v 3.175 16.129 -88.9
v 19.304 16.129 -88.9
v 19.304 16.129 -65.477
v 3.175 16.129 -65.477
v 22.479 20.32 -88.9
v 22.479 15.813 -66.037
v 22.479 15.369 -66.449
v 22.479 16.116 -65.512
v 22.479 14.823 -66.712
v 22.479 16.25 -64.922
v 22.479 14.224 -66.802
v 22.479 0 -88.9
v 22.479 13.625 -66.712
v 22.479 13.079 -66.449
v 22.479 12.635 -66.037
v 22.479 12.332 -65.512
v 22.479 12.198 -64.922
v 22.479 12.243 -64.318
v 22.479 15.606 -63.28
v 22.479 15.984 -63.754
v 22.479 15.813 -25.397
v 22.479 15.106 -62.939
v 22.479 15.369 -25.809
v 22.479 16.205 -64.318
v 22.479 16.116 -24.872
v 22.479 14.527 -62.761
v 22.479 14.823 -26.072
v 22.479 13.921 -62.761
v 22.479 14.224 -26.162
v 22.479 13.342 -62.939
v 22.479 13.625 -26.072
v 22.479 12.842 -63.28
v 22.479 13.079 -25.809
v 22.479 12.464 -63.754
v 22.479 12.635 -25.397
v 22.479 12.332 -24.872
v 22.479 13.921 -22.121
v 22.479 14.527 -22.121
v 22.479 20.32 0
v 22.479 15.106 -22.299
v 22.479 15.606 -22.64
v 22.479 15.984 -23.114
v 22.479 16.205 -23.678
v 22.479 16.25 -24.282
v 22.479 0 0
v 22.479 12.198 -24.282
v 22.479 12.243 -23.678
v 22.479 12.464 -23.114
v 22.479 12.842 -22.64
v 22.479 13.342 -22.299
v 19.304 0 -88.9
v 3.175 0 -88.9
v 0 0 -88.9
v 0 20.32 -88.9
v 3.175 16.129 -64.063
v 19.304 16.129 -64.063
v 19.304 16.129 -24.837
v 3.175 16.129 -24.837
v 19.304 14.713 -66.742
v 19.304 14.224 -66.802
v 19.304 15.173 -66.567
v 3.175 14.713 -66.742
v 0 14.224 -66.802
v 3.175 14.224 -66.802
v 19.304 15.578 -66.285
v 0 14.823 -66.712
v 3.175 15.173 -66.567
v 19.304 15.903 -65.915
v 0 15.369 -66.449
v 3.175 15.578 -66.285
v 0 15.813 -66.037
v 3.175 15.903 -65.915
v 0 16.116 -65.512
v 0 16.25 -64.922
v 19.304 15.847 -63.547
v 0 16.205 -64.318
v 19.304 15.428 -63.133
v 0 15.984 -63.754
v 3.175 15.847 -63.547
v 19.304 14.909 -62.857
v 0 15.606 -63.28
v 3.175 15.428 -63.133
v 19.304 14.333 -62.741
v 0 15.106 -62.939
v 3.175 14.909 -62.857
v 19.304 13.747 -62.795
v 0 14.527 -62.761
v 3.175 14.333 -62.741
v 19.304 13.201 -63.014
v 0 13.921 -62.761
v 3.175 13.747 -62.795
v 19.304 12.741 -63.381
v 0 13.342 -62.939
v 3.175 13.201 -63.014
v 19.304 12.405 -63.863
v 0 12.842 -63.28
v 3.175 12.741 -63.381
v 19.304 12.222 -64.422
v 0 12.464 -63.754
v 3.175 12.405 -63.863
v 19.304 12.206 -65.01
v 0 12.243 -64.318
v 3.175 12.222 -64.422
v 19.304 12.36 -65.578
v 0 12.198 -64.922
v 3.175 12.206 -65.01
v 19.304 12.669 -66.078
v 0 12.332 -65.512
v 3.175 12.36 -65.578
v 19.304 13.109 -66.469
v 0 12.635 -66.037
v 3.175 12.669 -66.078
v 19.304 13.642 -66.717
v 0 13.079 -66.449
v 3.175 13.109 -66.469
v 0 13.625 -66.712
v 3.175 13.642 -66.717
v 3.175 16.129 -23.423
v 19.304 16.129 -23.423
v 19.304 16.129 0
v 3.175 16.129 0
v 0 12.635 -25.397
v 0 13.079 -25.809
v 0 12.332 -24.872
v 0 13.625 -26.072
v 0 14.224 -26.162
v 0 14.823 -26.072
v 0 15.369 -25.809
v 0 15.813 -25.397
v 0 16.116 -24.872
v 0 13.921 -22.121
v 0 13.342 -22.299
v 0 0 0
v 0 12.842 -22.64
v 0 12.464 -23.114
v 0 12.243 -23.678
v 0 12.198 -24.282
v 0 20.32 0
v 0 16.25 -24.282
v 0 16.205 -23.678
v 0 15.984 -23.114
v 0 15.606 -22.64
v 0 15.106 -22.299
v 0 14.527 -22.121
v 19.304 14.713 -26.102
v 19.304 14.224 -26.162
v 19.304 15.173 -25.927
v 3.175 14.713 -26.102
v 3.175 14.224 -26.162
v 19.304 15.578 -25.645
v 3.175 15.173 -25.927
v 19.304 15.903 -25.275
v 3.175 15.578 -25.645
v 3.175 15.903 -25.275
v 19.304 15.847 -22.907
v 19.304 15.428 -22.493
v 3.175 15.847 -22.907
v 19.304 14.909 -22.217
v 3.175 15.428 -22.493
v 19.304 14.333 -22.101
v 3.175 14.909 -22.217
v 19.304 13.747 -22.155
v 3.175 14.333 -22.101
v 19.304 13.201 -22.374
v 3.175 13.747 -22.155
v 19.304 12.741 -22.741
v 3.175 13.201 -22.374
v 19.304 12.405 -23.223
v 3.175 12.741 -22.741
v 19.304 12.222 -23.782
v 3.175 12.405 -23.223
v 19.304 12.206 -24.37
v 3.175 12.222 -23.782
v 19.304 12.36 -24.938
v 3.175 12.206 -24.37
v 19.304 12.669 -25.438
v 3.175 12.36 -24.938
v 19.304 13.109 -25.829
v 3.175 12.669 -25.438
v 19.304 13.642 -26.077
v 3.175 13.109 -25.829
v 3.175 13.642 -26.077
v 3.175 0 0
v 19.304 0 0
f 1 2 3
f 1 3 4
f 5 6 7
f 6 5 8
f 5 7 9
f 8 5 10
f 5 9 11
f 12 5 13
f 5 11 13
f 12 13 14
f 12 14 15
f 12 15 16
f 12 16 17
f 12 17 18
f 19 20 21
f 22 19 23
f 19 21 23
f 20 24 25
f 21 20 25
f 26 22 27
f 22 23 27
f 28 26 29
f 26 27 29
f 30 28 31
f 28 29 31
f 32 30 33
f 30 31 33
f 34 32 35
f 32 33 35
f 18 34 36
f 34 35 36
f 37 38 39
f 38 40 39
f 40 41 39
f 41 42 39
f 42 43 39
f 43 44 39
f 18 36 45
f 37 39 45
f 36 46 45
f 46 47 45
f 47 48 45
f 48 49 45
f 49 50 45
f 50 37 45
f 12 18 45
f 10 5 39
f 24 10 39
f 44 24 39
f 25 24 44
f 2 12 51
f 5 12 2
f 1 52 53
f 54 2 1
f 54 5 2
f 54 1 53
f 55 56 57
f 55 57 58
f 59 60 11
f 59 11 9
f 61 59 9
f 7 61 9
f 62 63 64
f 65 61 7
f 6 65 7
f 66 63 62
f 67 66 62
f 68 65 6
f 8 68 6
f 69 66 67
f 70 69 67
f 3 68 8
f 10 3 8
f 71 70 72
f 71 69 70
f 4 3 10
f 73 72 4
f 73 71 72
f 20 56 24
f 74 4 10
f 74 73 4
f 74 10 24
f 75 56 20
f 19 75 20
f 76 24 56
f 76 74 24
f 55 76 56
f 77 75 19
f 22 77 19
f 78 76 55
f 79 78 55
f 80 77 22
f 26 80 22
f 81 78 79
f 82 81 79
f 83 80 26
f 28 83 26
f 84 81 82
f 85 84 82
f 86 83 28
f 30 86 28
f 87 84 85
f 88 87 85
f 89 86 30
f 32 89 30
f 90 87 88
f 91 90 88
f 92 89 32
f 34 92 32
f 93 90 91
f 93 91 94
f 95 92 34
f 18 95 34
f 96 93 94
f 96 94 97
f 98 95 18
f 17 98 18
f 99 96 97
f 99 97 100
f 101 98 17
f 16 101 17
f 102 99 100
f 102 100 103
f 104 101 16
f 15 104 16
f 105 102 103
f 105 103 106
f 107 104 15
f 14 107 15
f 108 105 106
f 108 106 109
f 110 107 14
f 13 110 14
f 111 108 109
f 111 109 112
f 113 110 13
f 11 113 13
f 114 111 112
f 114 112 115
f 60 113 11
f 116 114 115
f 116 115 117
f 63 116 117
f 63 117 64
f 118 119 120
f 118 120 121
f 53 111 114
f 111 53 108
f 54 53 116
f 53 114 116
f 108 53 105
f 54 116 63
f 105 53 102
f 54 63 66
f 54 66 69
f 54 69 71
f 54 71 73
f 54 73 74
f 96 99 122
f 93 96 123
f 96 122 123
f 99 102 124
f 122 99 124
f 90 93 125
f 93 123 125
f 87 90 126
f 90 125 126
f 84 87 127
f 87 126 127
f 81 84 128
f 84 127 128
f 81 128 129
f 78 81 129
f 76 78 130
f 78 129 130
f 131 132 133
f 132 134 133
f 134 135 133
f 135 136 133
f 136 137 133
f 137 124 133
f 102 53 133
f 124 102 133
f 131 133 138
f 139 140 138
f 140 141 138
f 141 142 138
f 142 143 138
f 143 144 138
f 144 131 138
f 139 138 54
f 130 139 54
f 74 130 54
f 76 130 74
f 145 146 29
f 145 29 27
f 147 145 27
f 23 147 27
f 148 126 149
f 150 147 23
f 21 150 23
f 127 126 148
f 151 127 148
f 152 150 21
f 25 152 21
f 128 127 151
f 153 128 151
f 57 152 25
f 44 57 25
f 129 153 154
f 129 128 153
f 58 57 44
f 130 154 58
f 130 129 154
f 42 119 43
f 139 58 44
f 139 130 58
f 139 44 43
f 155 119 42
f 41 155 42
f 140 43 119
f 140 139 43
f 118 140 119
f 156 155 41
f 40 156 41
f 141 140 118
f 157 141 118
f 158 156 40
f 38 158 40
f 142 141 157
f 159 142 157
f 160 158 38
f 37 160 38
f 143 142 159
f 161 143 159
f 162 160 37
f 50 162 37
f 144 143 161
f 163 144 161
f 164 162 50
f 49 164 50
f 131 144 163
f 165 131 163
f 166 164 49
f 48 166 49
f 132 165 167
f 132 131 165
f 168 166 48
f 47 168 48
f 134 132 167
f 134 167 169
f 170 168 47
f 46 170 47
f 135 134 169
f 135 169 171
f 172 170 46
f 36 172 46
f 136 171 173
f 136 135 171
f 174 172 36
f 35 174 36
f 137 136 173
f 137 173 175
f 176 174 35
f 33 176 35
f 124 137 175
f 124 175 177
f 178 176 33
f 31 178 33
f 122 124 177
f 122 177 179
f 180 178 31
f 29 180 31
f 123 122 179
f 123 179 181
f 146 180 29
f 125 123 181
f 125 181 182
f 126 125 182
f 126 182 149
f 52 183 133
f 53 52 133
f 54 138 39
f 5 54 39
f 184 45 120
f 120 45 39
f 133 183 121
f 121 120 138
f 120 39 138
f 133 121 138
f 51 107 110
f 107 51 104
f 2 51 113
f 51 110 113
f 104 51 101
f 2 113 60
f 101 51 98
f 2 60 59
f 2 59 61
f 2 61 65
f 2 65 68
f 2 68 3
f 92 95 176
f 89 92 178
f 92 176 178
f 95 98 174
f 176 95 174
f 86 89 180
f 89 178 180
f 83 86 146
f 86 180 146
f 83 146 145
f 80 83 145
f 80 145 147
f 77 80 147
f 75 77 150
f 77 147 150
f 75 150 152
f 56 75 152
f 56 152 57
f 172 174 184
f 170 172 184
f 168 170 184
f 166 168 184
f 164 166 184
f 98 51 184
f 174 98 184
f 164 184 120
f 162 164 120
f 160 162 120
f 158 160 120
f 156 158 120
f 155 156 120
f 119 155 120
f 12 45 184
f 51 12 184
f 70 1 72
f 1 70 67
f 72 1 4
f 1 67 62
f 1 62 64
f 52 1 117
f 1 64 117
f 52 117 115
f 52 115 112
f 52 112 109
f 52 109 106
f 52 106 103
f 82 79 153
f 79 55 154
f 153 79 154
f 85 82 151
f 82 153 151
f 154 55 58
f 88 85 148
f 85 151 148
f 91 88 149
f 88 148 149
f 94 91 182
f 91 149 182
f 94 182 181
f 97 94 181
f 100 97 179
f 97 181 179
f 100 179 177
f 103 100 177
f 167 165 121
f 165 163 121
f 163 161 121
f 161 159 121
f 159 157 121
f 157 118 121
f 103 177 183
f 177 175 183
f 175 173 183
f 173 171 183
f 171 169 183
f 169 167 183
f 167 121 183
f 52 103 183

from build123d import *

# Parameters (mm, degrees)
BOSS_EXTRUDE2_DEPTH = 88.9
SKETCH19_R          = 2.032
CUT_EXTRUDE3_DEPTH  = 94.922403297


with BuildPart() as part:
    # Sketch2 → Boss-Extrude2 (new body)
    with BuildSketch(Plane.XY):
        Polygon((0, 0), (0, 20.32), (22.479, 20.32), (22.479, 0), (19.304, 0), (19.304, 16.129), (3.175, 16.129), (3.175, 0), align=None)
    extrude(amount=-BOSS_EXTRUDE2_DEPTH)

    # Sketch19 → Cut-Extrude3 (cut, through all)
    with BuildSketch(Plane(origin=(0, 0, 0), x_dir=(0, 0, -1), z_dir=(1, 0, 0))):
        with Locations((24.13, 14.224)):
            Circle(SKETCH19_R)
        with Locations((64.77, 14.224)):
            Circle(SKETCH19_R)
    extrude(amount=CUT_EXTRUDE3_DEPTH, mode=Mode.SUBTRACT)


solid = part.part
